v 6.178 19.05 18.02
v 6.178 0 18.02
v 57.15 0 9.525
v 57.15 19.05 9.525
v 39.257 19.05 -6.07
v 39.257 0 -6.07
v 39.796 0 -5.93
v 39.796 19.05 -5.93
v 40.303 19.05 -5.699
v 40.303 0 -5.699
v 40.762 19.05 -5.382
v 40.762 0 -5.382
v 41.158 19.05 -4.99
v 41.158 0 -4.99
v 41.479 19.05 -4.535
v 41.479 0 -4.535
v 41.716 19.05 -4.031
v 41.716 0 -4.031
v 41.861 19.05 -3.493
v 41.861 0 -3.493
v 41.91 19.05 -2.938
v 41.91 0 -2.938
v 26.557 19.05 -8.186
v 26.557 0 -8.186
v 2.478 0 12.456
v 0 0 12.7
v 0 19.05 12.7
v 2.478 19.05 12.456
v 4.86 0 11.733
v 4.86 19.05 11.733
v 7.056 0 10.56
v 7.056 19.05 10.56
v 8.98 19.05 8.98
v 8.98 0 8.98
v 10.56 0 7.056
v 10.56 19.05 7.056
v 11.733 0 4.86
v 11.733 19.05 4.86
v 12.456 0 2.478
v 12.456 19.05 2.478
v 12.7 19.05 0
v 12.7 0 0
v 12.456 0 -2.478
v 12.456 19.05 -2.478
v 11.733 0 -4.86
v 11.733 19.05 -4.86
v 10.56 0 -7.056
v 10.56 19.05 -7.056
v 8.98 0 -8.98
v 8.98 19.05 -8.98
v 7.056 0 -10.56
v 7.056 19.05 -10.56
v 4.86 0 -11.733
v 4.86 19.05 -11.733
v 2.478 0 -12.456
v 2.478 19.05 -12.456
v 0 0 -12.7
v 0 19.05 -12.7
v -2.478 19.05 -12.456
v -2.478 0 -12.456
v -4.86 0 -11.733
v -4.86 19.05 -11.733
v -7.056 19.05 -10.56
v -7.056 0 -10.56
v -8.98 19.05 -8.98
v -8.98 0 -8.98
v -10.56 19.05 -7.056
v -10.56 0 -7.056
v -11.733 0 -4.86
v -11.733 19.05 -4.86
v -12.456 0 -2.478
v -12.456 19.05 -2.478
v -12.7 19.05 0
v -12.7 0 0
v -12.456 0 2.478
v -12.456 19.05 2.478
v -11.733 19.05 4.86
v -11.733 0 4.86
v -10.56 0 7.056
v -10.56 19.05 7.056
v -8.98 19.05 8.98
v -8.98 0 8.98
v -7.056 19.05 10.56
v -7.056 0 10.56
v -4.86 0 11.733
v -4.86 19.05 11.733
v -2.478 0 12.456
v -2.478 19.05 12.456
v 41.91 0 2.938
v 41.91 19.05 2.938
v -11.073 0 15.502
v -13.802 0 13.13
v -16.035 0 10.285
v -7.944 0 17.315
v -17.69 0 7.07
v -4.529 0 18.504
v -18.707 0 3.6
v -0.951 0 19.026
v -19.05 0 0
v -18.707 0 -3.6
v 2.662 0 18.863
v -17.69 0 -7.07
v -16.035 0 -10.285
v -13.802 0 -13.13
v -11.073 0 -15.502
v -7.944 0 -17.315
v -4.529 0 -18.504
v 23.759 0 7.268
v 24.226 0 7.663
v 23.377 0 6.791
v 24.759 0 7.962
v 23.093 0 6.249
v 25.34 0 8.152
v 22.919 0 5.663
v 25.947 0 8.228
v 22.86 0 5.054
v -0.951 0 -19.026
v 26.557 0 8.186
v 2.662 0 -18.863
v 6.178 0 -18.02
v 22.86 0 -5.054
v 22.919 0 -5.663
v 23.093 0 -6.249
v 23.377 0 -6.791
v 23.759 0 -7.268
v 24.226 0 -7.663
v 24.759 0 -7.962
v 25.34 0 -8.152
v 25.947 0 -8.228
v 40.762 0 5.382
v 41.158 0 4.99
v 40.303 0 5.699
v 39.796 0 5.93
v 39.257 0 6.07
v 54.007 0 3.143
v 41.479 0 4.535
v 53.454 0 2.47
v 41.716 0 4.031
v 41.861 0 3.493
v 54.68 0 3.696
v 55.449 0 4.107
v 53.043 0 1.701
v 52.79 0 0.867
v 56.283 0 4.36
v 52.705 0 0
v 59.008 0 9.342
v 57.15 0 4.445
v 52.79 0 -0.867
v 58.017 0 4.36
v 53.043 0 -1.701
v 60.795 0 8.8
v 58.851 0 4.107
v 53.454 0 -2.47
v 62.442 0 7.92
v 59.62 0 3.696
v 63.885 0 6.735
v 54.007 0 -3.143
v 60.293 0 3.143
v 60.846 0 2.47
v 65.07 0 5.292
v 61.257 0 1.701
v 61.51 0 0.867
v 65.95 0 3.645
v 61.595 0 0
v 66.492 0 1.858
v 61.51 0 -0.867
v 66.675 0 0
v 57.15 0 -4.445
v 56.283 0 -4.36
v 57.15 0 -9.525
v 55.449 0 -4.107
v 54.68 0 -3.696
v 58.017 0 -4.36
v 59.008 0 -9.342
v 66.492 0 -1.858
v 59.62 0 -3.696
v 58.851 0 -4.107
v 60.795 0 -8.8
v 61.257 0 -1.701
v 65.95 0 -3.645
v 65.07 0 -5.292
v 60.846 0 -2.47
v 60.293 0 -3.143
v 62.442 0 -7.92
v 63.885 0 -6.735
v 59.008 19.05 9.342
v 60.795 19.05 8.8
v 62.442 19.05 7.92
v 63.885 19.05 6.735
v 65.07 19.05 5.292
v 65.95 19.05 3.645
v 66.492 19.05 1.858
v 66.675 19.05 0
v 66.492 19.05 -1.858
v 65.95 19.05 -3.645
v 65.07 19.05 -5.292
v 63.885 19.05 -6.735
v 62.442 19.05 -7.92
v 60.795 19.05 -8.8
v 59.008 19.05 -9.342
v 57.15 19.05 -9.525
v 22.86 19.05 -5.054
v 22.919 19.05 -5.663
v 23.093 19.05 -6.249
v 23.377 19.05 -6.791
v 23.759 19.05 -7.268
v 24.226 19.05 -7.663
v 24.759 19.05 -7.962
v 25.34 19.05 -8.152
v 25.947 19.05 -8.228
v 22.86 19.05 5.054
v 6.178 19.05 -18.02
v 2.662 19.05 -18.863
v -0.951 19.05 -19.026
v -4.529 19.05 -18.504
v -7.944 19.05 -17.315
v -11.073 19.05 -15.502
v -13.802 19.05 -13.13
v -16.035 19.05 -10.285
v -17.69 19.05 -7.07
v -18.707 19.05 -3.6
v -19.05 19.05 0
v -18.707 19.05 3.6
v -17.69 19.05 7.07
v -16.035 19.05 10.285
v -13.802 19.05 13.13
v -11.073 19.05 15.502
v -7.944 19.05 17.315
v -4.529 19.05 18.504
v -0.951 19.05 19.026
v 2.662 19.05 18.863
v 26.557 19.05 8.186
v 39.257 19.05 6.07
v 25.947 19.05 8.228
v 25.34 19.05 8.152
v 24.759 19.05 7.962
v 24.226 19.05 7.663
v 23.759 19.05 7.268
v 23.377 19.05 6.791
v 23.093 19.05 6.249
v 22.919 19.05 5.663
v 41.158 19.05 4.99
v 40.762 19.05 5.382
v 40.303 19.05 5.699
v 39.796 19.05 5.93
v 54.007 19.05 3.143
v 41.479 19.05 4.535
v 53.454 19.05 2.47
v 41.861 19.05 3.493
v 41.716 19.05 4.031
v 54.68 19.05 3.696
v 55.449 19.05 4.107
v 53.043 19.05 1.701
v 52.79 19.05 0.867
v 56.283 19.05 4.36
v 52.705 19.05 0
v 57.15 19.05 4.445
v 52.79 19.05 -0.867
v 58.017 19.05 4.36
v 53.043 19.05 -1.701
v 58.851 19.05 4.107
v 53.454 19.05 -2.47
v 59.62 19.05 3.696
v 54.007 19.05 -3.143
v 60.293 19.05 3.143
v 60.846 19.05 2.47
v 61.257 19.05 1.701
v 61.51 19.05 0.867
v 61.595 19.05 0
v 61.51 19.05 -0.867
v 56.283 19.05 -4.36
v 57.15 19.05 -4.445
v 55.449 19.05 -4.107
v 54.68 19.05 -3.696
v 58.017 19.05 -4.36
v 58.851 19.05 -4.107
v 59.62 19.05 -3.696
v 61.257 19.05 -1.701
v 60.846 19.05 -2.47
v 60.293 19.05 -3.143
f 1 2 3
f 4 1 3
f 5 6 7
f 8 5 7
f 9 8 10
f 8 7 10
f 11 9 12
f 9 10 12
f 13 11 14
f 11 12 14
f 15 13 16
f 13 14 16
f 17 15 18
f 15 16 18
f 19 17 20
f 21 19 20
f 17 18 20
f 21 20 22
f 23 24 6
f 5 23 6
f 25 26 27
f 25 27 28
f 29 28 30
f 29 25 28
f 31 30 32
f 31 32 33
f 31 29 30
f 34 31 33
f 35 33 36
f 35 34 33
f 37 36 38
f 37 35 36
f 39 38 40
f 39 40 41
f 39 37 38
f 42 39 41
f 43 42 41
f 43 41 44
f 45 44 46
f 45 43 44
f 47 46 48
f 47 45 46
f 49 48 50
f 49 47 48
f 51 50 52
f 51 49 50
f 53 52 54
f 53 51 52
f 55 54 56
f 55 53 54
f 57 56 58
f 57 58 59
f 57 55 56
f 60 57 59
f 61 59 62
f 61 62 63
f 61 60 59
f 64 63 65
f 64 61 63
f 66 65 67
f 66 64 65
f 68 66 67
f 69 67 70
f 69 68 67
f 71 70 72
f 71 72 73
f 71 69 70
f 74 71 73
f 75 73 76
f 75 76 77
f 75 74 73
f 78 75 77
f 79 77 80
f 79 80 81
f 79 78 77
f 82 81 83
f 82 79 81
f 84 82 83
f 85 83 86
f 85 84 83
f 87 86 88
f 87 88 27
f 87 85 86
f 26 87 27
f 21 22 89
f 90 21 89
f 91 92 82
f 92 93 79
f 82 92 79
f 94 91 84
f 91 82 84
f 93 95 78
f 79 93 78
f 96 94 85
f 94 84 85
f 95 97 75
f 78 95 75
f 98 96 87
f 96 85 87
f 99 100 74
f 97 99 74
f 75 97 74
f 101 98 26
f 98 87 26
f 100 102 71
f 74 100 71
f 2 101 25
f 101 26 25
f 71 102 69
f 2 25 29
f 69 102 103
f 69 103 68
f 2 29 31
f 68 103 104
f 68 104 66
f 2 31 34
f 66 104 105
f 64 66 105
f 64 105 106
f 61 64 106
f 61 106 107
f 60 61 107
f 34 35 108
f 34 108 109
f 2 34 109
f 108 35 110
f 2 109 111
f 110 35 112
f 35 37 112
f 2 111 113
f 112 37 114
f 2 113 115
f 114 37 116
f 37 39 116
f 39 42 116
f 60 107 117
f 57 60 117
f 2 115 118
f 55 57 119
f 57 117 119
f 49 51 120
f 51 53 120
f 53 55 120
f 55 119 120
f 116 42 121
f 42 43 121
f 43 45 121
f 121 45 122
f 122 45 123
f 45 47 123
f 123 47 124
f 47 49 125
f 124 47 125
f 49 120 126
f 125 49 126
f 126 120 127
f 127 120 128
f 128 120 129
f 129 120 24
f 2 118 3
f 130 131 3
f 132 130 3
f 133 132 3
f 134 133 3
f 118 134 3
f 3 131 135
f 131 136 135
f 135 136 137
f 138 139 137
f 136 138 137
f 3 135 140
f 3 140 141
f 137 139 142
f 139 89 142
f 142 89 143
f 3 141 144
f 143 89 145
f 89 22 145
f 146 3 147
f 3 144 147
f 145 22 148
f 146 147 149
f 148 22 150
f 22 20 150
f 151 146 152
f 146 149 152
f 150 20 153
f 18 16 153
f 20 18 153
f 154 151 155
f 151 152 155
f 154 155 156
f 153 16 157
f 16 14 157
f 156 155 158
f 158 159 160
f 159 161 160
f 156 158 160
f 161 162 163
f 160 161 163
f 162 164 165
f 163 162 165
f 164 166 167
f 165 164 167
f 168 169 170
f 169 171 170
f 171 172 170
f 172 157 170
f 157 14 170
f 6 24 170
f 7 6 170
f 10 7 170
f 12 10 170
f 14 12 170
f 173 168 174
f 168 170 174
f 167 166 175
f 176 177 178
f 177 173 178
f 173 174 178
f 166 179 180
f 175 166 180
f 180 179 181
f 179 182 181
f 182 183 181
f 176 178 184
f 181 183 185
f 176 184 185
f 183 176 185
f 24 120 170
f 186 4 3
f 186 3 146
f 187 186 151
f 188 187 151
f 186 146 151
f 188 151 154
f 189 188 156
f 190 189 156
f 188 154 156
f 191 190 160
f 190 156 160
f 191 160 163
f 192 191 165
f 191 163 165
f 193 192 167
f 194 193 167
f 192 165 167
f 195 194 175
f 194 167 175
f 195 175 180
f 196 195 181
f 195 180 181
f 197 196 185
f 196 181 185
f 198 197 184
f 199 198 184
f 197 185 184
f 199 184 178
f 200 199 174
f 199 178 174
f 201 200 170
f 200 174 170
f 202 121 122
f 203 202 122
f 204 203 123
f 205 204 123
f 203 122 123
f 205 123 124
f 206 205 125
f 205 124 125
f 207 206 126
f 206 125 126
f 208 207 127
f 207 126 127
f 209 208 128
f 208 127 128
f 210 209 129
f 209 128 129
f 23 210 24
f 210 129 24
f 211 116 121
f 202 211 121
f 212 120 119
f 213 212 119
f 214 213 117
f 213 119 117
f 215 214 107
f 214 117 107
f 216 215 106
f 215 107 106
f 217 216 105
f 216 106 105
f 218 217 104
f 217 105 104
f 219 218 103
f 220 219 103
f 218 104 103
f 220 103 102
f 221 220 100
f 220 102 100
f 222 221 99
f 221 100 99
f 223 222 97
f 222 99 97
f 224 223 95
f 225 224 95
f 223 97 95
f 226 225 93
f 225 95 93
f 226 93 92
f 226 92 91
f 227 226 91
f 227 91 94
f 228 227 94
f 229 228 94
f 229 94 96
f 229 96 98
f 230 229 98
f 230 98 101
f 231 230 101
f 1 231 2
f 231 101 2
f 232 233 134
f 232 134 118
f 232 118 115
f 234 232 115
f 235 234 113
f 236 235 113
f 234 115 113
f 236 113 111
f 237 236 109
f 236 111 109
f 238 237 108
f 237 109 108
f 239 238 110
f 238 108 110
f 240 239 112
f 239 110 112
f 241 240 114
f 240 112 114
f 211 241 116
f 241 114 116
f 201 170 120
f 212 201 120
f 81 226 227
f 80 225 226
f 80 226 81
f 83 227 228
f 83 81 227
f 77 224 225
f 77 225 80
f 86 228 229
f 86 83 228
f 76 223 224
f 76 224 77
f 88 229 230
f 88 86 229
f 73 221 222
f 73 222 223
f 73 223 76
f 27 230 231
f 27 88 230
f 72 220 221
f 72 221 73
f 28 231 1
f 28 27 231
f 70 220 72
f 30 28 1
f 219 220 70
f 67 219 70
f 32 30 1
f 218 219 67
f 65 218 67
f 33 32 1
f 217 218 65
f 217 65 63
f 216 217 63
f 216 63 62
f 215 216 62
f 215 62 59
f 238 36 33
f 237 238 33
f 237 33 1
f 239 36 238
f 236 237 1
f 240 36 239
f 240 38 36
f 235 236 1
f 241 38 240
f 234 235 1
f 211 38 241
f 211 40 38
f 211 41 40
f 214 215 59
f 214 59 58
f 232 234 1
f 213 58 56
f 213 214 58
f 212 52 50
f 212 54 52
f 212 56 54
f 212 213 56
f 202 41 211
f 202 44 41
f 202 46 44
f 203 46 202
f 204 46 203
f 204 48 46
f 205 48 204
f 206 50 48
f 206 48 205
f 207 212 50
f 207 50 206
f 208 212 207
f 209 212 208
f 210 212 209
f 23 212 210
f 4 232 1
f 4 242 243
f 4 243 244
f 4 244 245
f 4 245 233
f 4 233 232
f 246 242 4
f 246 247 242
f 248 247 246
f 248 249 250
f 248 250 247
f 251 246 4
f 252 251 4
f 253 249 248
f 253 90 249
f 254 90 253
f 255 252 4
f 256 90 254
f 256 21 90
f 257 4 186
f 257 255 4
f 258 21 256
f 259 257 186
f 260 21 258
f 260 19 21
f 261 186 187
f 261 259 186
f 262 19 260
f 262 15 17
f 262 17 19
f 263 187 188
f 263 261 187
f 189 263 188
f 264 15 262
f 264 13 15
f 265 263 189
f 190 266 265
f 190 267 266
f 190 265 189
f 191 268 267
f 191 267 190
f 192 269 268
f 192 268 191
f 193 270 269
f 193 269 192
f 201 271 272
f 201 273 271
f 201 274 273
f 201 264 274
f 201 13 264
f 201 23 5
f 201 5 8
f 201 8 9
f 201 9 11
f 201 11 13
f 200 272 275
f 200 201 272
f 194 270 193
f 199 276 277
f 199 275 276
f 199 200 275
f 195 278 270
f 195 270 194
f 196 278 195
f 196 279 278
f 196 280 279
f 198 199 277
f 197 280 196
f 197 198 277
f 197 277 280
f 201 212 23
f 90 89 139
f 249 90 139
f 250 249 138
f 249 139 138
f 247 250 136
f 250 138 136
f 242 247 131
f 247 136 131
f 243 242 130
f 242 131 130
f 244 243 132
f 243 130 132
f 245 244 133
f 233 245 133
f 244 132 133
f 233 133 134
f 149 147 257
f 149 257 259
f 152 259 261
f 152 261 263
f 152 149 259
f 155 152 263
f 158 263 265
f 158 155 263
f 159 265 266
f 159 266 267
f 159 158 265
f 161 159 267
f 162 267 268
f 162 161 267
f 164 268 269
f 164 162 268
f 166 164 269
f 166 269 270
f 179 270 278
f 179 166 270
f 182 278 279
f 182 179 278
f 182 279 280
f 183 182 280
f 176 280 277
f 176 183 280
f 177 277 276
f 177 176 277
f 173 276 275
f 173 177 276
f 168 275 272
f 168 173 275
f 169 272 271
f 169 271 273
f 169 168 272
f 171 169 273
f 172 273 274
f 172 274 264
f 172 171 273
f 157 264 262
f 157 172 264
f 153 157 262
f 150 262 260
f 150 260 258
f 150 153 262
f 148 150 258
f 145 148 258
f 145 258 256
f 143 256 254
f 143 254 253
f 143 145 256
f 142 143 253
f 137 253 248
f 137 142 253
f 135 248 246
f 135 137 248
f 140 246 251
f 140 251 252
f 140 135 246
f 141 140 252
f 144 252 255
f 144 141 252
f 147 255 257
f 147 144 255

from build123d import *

# Parameters (mm, degrees)
SKETCH1_R           = 12.7
SKETCH1_R_2         = 4.445
BOSS_EXTRUDE2_DEPTH = 19.05


with BuildPart() as part:
    # Sketch1 → Boss-Extrude2 (new body)
    with BuildSketch(Plane(origin=(0, 0, 0), x_dir=(1, 0, 0), z_dir=(0, 1, 0))):
        with BuildLine():
            Line((6.178378378, -18.02027027), (57.15, -9.525))
            ThreePointArc((57.15, -9.525), (66.675, 0), (57.15, 9.525))
            Line((57.15, 9.525), (6.178378378, 18.02027027))
            ThreePointArc((6.178378378, 18.02027027), (-19.05, 0), (6.178378378, -18.02027027))
        make_face()
        with Locations(Location((0, 0, 0), (0, 0, 270))):
            Circle(SKETCH1_R, mode=Mode.SUBTRACT)
        with BuildLine():
            ThreePointArc((22.86, 5.054447816), (23.982759705, 7.477036261), (26.556966785, 8.186248525))
            Line((26.556966785, 8.186248525), (39.256966785, 6.069581858))
            ThreePointArc((39.256966785, 6.069581858), (41.157588444, 4.990021445), (41.91, 2.93778115))
            Line((41.91, 2.93778115), (41.91, -2.93778115))
            ThreePointArc((41.91, -2.93778115), (41.157588444, -4.990021445), (39.256966785, -6.069581858))
            Line((39.256966785, -6.069581858), (26.556966785, -8.186248525))
            ThreePointArc((26.556966785, -8.186248525), (23.982759705, -7.477036261), (22.86, -5.054447816))
            Line((22.86, -5.054447816), (22.86, 5.054447816))
        make_face(mode=Mode.SUBTRACT)
        with Locations(Location((57.15, 0, 0), (0, 0, 270))):
            Circle(SKETCH1_R_2, mode=Mode.SUBTRACT)
    extrude(amount=BOSS_EXTRUDE2_DEPTH)


solid = part.part
